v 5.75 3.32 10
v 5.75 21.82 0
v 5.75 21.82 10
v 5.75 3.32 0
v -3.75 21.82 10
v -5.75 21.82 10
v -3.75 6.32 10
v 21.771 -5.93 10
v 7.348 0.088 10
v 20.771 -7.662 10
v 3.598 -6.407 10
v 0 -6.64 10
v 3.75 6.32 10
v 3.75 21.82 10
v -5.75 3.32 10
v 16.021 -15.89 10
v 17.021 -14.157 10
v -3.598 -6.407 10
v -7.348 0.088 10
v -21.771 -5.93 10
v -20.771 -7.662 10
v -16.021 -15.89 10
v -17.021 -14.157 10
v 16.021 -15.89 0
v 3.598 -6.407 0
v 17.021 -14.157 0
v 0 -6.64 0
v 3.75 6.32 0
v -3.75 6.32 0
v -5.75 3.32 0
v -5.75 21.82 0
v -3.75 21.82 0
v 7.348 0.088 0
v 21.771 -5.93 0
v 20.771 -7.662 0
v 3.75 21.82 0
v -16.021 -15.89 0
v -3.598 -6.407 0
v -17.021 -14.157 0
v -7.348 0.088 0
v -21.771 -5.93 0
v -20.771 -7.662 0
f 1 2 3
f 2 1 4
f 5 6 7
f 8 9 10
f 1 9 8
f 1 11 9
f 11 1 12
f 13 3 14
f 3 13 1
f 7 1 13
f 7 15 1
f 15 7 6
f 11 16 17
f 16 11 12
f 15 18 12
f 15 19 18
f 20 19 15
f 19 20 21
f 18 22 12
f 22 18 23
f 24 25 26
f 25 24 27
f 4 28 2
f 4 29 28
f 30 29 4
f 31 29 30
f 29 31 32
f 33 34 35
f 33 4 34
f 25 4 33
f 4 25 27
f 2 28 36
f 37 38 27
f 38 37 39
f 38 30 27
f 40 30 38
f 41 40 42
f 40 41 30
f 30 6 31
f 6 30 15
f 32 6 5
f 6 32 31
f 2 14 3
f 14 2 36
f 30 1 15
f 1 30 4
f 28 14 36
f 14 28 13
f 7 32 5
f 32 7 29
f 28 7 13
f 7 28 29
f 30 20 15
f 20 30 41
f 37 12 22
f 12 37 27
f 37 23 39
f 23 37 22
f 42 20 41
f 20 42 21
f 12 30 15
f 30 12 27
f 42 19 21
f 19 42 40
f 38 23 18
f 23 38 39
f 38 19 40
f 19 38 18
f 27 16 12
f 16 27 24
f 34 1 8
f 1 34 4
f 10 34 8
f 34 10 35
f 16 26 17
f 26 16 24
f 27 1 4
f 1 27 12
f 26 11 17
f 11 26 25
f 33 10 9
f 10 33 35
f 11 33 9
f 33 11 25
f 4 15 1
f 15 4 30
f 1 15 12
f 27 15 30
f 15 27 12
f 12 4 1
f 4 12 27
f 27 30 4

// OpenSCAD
/*

Hex Shelving Bracket 

Revision History
- Patrick McGorrill 08/2019 - first version

This work is licensed under a 
Commons Attribution-ShareAlike 4.0 International License. 
To view a copy of the license, visit 
https://creativecommons.org/licenses/by-sa/4.0/

*/


// this sets the width of the gap in the protruding bits
width = 7.5;

// this sets the length of the protruding bits
depth = 16.5;

// this sets the thickness of the shape
thickness = 4;

// this sets the height of the shape
height = 10;

//this sets whether the piece will have two or three protruding bits
two_or_three=2;// [1:Two, 2:Three,]

outer_width = width+thickness;

outer_depth = depth+(thickness/2);

travel = (outer_depth/2)+(sqrt(3)*outer_width)/6;

// this "bracket" is the base shape of the design 
// a rectangular prism minus a smaller rectangular prism

module bracket(){
difference(){
    cube([outer_width,outer_depth,height],center=true);
    translate([0,thickness/4+1,0])
        cube([width,depth,height+1], center=true);
}
}

translate(v=[0,0,height/2]){

// for two or three iterations, we make the bracket shape and 
// rotate it by 120 degrees around the z axis
// also we move the bracket shape, along its y axis, out from 
// the center "travel" number of units so they form a triangle 
// with sides roughly "outer_width" long

    for (i=[0:two_or_three])
        rotate(a=[0,0,i*120])
        translate(v=[0,travel,0])
        bracket();

// a triangular cylinder to fill in the center

    rotate(a=[0,0,30])
        cylinder(h=height, r=sqrt(3)*outer_width/3, center=true, $fn=3);
}
